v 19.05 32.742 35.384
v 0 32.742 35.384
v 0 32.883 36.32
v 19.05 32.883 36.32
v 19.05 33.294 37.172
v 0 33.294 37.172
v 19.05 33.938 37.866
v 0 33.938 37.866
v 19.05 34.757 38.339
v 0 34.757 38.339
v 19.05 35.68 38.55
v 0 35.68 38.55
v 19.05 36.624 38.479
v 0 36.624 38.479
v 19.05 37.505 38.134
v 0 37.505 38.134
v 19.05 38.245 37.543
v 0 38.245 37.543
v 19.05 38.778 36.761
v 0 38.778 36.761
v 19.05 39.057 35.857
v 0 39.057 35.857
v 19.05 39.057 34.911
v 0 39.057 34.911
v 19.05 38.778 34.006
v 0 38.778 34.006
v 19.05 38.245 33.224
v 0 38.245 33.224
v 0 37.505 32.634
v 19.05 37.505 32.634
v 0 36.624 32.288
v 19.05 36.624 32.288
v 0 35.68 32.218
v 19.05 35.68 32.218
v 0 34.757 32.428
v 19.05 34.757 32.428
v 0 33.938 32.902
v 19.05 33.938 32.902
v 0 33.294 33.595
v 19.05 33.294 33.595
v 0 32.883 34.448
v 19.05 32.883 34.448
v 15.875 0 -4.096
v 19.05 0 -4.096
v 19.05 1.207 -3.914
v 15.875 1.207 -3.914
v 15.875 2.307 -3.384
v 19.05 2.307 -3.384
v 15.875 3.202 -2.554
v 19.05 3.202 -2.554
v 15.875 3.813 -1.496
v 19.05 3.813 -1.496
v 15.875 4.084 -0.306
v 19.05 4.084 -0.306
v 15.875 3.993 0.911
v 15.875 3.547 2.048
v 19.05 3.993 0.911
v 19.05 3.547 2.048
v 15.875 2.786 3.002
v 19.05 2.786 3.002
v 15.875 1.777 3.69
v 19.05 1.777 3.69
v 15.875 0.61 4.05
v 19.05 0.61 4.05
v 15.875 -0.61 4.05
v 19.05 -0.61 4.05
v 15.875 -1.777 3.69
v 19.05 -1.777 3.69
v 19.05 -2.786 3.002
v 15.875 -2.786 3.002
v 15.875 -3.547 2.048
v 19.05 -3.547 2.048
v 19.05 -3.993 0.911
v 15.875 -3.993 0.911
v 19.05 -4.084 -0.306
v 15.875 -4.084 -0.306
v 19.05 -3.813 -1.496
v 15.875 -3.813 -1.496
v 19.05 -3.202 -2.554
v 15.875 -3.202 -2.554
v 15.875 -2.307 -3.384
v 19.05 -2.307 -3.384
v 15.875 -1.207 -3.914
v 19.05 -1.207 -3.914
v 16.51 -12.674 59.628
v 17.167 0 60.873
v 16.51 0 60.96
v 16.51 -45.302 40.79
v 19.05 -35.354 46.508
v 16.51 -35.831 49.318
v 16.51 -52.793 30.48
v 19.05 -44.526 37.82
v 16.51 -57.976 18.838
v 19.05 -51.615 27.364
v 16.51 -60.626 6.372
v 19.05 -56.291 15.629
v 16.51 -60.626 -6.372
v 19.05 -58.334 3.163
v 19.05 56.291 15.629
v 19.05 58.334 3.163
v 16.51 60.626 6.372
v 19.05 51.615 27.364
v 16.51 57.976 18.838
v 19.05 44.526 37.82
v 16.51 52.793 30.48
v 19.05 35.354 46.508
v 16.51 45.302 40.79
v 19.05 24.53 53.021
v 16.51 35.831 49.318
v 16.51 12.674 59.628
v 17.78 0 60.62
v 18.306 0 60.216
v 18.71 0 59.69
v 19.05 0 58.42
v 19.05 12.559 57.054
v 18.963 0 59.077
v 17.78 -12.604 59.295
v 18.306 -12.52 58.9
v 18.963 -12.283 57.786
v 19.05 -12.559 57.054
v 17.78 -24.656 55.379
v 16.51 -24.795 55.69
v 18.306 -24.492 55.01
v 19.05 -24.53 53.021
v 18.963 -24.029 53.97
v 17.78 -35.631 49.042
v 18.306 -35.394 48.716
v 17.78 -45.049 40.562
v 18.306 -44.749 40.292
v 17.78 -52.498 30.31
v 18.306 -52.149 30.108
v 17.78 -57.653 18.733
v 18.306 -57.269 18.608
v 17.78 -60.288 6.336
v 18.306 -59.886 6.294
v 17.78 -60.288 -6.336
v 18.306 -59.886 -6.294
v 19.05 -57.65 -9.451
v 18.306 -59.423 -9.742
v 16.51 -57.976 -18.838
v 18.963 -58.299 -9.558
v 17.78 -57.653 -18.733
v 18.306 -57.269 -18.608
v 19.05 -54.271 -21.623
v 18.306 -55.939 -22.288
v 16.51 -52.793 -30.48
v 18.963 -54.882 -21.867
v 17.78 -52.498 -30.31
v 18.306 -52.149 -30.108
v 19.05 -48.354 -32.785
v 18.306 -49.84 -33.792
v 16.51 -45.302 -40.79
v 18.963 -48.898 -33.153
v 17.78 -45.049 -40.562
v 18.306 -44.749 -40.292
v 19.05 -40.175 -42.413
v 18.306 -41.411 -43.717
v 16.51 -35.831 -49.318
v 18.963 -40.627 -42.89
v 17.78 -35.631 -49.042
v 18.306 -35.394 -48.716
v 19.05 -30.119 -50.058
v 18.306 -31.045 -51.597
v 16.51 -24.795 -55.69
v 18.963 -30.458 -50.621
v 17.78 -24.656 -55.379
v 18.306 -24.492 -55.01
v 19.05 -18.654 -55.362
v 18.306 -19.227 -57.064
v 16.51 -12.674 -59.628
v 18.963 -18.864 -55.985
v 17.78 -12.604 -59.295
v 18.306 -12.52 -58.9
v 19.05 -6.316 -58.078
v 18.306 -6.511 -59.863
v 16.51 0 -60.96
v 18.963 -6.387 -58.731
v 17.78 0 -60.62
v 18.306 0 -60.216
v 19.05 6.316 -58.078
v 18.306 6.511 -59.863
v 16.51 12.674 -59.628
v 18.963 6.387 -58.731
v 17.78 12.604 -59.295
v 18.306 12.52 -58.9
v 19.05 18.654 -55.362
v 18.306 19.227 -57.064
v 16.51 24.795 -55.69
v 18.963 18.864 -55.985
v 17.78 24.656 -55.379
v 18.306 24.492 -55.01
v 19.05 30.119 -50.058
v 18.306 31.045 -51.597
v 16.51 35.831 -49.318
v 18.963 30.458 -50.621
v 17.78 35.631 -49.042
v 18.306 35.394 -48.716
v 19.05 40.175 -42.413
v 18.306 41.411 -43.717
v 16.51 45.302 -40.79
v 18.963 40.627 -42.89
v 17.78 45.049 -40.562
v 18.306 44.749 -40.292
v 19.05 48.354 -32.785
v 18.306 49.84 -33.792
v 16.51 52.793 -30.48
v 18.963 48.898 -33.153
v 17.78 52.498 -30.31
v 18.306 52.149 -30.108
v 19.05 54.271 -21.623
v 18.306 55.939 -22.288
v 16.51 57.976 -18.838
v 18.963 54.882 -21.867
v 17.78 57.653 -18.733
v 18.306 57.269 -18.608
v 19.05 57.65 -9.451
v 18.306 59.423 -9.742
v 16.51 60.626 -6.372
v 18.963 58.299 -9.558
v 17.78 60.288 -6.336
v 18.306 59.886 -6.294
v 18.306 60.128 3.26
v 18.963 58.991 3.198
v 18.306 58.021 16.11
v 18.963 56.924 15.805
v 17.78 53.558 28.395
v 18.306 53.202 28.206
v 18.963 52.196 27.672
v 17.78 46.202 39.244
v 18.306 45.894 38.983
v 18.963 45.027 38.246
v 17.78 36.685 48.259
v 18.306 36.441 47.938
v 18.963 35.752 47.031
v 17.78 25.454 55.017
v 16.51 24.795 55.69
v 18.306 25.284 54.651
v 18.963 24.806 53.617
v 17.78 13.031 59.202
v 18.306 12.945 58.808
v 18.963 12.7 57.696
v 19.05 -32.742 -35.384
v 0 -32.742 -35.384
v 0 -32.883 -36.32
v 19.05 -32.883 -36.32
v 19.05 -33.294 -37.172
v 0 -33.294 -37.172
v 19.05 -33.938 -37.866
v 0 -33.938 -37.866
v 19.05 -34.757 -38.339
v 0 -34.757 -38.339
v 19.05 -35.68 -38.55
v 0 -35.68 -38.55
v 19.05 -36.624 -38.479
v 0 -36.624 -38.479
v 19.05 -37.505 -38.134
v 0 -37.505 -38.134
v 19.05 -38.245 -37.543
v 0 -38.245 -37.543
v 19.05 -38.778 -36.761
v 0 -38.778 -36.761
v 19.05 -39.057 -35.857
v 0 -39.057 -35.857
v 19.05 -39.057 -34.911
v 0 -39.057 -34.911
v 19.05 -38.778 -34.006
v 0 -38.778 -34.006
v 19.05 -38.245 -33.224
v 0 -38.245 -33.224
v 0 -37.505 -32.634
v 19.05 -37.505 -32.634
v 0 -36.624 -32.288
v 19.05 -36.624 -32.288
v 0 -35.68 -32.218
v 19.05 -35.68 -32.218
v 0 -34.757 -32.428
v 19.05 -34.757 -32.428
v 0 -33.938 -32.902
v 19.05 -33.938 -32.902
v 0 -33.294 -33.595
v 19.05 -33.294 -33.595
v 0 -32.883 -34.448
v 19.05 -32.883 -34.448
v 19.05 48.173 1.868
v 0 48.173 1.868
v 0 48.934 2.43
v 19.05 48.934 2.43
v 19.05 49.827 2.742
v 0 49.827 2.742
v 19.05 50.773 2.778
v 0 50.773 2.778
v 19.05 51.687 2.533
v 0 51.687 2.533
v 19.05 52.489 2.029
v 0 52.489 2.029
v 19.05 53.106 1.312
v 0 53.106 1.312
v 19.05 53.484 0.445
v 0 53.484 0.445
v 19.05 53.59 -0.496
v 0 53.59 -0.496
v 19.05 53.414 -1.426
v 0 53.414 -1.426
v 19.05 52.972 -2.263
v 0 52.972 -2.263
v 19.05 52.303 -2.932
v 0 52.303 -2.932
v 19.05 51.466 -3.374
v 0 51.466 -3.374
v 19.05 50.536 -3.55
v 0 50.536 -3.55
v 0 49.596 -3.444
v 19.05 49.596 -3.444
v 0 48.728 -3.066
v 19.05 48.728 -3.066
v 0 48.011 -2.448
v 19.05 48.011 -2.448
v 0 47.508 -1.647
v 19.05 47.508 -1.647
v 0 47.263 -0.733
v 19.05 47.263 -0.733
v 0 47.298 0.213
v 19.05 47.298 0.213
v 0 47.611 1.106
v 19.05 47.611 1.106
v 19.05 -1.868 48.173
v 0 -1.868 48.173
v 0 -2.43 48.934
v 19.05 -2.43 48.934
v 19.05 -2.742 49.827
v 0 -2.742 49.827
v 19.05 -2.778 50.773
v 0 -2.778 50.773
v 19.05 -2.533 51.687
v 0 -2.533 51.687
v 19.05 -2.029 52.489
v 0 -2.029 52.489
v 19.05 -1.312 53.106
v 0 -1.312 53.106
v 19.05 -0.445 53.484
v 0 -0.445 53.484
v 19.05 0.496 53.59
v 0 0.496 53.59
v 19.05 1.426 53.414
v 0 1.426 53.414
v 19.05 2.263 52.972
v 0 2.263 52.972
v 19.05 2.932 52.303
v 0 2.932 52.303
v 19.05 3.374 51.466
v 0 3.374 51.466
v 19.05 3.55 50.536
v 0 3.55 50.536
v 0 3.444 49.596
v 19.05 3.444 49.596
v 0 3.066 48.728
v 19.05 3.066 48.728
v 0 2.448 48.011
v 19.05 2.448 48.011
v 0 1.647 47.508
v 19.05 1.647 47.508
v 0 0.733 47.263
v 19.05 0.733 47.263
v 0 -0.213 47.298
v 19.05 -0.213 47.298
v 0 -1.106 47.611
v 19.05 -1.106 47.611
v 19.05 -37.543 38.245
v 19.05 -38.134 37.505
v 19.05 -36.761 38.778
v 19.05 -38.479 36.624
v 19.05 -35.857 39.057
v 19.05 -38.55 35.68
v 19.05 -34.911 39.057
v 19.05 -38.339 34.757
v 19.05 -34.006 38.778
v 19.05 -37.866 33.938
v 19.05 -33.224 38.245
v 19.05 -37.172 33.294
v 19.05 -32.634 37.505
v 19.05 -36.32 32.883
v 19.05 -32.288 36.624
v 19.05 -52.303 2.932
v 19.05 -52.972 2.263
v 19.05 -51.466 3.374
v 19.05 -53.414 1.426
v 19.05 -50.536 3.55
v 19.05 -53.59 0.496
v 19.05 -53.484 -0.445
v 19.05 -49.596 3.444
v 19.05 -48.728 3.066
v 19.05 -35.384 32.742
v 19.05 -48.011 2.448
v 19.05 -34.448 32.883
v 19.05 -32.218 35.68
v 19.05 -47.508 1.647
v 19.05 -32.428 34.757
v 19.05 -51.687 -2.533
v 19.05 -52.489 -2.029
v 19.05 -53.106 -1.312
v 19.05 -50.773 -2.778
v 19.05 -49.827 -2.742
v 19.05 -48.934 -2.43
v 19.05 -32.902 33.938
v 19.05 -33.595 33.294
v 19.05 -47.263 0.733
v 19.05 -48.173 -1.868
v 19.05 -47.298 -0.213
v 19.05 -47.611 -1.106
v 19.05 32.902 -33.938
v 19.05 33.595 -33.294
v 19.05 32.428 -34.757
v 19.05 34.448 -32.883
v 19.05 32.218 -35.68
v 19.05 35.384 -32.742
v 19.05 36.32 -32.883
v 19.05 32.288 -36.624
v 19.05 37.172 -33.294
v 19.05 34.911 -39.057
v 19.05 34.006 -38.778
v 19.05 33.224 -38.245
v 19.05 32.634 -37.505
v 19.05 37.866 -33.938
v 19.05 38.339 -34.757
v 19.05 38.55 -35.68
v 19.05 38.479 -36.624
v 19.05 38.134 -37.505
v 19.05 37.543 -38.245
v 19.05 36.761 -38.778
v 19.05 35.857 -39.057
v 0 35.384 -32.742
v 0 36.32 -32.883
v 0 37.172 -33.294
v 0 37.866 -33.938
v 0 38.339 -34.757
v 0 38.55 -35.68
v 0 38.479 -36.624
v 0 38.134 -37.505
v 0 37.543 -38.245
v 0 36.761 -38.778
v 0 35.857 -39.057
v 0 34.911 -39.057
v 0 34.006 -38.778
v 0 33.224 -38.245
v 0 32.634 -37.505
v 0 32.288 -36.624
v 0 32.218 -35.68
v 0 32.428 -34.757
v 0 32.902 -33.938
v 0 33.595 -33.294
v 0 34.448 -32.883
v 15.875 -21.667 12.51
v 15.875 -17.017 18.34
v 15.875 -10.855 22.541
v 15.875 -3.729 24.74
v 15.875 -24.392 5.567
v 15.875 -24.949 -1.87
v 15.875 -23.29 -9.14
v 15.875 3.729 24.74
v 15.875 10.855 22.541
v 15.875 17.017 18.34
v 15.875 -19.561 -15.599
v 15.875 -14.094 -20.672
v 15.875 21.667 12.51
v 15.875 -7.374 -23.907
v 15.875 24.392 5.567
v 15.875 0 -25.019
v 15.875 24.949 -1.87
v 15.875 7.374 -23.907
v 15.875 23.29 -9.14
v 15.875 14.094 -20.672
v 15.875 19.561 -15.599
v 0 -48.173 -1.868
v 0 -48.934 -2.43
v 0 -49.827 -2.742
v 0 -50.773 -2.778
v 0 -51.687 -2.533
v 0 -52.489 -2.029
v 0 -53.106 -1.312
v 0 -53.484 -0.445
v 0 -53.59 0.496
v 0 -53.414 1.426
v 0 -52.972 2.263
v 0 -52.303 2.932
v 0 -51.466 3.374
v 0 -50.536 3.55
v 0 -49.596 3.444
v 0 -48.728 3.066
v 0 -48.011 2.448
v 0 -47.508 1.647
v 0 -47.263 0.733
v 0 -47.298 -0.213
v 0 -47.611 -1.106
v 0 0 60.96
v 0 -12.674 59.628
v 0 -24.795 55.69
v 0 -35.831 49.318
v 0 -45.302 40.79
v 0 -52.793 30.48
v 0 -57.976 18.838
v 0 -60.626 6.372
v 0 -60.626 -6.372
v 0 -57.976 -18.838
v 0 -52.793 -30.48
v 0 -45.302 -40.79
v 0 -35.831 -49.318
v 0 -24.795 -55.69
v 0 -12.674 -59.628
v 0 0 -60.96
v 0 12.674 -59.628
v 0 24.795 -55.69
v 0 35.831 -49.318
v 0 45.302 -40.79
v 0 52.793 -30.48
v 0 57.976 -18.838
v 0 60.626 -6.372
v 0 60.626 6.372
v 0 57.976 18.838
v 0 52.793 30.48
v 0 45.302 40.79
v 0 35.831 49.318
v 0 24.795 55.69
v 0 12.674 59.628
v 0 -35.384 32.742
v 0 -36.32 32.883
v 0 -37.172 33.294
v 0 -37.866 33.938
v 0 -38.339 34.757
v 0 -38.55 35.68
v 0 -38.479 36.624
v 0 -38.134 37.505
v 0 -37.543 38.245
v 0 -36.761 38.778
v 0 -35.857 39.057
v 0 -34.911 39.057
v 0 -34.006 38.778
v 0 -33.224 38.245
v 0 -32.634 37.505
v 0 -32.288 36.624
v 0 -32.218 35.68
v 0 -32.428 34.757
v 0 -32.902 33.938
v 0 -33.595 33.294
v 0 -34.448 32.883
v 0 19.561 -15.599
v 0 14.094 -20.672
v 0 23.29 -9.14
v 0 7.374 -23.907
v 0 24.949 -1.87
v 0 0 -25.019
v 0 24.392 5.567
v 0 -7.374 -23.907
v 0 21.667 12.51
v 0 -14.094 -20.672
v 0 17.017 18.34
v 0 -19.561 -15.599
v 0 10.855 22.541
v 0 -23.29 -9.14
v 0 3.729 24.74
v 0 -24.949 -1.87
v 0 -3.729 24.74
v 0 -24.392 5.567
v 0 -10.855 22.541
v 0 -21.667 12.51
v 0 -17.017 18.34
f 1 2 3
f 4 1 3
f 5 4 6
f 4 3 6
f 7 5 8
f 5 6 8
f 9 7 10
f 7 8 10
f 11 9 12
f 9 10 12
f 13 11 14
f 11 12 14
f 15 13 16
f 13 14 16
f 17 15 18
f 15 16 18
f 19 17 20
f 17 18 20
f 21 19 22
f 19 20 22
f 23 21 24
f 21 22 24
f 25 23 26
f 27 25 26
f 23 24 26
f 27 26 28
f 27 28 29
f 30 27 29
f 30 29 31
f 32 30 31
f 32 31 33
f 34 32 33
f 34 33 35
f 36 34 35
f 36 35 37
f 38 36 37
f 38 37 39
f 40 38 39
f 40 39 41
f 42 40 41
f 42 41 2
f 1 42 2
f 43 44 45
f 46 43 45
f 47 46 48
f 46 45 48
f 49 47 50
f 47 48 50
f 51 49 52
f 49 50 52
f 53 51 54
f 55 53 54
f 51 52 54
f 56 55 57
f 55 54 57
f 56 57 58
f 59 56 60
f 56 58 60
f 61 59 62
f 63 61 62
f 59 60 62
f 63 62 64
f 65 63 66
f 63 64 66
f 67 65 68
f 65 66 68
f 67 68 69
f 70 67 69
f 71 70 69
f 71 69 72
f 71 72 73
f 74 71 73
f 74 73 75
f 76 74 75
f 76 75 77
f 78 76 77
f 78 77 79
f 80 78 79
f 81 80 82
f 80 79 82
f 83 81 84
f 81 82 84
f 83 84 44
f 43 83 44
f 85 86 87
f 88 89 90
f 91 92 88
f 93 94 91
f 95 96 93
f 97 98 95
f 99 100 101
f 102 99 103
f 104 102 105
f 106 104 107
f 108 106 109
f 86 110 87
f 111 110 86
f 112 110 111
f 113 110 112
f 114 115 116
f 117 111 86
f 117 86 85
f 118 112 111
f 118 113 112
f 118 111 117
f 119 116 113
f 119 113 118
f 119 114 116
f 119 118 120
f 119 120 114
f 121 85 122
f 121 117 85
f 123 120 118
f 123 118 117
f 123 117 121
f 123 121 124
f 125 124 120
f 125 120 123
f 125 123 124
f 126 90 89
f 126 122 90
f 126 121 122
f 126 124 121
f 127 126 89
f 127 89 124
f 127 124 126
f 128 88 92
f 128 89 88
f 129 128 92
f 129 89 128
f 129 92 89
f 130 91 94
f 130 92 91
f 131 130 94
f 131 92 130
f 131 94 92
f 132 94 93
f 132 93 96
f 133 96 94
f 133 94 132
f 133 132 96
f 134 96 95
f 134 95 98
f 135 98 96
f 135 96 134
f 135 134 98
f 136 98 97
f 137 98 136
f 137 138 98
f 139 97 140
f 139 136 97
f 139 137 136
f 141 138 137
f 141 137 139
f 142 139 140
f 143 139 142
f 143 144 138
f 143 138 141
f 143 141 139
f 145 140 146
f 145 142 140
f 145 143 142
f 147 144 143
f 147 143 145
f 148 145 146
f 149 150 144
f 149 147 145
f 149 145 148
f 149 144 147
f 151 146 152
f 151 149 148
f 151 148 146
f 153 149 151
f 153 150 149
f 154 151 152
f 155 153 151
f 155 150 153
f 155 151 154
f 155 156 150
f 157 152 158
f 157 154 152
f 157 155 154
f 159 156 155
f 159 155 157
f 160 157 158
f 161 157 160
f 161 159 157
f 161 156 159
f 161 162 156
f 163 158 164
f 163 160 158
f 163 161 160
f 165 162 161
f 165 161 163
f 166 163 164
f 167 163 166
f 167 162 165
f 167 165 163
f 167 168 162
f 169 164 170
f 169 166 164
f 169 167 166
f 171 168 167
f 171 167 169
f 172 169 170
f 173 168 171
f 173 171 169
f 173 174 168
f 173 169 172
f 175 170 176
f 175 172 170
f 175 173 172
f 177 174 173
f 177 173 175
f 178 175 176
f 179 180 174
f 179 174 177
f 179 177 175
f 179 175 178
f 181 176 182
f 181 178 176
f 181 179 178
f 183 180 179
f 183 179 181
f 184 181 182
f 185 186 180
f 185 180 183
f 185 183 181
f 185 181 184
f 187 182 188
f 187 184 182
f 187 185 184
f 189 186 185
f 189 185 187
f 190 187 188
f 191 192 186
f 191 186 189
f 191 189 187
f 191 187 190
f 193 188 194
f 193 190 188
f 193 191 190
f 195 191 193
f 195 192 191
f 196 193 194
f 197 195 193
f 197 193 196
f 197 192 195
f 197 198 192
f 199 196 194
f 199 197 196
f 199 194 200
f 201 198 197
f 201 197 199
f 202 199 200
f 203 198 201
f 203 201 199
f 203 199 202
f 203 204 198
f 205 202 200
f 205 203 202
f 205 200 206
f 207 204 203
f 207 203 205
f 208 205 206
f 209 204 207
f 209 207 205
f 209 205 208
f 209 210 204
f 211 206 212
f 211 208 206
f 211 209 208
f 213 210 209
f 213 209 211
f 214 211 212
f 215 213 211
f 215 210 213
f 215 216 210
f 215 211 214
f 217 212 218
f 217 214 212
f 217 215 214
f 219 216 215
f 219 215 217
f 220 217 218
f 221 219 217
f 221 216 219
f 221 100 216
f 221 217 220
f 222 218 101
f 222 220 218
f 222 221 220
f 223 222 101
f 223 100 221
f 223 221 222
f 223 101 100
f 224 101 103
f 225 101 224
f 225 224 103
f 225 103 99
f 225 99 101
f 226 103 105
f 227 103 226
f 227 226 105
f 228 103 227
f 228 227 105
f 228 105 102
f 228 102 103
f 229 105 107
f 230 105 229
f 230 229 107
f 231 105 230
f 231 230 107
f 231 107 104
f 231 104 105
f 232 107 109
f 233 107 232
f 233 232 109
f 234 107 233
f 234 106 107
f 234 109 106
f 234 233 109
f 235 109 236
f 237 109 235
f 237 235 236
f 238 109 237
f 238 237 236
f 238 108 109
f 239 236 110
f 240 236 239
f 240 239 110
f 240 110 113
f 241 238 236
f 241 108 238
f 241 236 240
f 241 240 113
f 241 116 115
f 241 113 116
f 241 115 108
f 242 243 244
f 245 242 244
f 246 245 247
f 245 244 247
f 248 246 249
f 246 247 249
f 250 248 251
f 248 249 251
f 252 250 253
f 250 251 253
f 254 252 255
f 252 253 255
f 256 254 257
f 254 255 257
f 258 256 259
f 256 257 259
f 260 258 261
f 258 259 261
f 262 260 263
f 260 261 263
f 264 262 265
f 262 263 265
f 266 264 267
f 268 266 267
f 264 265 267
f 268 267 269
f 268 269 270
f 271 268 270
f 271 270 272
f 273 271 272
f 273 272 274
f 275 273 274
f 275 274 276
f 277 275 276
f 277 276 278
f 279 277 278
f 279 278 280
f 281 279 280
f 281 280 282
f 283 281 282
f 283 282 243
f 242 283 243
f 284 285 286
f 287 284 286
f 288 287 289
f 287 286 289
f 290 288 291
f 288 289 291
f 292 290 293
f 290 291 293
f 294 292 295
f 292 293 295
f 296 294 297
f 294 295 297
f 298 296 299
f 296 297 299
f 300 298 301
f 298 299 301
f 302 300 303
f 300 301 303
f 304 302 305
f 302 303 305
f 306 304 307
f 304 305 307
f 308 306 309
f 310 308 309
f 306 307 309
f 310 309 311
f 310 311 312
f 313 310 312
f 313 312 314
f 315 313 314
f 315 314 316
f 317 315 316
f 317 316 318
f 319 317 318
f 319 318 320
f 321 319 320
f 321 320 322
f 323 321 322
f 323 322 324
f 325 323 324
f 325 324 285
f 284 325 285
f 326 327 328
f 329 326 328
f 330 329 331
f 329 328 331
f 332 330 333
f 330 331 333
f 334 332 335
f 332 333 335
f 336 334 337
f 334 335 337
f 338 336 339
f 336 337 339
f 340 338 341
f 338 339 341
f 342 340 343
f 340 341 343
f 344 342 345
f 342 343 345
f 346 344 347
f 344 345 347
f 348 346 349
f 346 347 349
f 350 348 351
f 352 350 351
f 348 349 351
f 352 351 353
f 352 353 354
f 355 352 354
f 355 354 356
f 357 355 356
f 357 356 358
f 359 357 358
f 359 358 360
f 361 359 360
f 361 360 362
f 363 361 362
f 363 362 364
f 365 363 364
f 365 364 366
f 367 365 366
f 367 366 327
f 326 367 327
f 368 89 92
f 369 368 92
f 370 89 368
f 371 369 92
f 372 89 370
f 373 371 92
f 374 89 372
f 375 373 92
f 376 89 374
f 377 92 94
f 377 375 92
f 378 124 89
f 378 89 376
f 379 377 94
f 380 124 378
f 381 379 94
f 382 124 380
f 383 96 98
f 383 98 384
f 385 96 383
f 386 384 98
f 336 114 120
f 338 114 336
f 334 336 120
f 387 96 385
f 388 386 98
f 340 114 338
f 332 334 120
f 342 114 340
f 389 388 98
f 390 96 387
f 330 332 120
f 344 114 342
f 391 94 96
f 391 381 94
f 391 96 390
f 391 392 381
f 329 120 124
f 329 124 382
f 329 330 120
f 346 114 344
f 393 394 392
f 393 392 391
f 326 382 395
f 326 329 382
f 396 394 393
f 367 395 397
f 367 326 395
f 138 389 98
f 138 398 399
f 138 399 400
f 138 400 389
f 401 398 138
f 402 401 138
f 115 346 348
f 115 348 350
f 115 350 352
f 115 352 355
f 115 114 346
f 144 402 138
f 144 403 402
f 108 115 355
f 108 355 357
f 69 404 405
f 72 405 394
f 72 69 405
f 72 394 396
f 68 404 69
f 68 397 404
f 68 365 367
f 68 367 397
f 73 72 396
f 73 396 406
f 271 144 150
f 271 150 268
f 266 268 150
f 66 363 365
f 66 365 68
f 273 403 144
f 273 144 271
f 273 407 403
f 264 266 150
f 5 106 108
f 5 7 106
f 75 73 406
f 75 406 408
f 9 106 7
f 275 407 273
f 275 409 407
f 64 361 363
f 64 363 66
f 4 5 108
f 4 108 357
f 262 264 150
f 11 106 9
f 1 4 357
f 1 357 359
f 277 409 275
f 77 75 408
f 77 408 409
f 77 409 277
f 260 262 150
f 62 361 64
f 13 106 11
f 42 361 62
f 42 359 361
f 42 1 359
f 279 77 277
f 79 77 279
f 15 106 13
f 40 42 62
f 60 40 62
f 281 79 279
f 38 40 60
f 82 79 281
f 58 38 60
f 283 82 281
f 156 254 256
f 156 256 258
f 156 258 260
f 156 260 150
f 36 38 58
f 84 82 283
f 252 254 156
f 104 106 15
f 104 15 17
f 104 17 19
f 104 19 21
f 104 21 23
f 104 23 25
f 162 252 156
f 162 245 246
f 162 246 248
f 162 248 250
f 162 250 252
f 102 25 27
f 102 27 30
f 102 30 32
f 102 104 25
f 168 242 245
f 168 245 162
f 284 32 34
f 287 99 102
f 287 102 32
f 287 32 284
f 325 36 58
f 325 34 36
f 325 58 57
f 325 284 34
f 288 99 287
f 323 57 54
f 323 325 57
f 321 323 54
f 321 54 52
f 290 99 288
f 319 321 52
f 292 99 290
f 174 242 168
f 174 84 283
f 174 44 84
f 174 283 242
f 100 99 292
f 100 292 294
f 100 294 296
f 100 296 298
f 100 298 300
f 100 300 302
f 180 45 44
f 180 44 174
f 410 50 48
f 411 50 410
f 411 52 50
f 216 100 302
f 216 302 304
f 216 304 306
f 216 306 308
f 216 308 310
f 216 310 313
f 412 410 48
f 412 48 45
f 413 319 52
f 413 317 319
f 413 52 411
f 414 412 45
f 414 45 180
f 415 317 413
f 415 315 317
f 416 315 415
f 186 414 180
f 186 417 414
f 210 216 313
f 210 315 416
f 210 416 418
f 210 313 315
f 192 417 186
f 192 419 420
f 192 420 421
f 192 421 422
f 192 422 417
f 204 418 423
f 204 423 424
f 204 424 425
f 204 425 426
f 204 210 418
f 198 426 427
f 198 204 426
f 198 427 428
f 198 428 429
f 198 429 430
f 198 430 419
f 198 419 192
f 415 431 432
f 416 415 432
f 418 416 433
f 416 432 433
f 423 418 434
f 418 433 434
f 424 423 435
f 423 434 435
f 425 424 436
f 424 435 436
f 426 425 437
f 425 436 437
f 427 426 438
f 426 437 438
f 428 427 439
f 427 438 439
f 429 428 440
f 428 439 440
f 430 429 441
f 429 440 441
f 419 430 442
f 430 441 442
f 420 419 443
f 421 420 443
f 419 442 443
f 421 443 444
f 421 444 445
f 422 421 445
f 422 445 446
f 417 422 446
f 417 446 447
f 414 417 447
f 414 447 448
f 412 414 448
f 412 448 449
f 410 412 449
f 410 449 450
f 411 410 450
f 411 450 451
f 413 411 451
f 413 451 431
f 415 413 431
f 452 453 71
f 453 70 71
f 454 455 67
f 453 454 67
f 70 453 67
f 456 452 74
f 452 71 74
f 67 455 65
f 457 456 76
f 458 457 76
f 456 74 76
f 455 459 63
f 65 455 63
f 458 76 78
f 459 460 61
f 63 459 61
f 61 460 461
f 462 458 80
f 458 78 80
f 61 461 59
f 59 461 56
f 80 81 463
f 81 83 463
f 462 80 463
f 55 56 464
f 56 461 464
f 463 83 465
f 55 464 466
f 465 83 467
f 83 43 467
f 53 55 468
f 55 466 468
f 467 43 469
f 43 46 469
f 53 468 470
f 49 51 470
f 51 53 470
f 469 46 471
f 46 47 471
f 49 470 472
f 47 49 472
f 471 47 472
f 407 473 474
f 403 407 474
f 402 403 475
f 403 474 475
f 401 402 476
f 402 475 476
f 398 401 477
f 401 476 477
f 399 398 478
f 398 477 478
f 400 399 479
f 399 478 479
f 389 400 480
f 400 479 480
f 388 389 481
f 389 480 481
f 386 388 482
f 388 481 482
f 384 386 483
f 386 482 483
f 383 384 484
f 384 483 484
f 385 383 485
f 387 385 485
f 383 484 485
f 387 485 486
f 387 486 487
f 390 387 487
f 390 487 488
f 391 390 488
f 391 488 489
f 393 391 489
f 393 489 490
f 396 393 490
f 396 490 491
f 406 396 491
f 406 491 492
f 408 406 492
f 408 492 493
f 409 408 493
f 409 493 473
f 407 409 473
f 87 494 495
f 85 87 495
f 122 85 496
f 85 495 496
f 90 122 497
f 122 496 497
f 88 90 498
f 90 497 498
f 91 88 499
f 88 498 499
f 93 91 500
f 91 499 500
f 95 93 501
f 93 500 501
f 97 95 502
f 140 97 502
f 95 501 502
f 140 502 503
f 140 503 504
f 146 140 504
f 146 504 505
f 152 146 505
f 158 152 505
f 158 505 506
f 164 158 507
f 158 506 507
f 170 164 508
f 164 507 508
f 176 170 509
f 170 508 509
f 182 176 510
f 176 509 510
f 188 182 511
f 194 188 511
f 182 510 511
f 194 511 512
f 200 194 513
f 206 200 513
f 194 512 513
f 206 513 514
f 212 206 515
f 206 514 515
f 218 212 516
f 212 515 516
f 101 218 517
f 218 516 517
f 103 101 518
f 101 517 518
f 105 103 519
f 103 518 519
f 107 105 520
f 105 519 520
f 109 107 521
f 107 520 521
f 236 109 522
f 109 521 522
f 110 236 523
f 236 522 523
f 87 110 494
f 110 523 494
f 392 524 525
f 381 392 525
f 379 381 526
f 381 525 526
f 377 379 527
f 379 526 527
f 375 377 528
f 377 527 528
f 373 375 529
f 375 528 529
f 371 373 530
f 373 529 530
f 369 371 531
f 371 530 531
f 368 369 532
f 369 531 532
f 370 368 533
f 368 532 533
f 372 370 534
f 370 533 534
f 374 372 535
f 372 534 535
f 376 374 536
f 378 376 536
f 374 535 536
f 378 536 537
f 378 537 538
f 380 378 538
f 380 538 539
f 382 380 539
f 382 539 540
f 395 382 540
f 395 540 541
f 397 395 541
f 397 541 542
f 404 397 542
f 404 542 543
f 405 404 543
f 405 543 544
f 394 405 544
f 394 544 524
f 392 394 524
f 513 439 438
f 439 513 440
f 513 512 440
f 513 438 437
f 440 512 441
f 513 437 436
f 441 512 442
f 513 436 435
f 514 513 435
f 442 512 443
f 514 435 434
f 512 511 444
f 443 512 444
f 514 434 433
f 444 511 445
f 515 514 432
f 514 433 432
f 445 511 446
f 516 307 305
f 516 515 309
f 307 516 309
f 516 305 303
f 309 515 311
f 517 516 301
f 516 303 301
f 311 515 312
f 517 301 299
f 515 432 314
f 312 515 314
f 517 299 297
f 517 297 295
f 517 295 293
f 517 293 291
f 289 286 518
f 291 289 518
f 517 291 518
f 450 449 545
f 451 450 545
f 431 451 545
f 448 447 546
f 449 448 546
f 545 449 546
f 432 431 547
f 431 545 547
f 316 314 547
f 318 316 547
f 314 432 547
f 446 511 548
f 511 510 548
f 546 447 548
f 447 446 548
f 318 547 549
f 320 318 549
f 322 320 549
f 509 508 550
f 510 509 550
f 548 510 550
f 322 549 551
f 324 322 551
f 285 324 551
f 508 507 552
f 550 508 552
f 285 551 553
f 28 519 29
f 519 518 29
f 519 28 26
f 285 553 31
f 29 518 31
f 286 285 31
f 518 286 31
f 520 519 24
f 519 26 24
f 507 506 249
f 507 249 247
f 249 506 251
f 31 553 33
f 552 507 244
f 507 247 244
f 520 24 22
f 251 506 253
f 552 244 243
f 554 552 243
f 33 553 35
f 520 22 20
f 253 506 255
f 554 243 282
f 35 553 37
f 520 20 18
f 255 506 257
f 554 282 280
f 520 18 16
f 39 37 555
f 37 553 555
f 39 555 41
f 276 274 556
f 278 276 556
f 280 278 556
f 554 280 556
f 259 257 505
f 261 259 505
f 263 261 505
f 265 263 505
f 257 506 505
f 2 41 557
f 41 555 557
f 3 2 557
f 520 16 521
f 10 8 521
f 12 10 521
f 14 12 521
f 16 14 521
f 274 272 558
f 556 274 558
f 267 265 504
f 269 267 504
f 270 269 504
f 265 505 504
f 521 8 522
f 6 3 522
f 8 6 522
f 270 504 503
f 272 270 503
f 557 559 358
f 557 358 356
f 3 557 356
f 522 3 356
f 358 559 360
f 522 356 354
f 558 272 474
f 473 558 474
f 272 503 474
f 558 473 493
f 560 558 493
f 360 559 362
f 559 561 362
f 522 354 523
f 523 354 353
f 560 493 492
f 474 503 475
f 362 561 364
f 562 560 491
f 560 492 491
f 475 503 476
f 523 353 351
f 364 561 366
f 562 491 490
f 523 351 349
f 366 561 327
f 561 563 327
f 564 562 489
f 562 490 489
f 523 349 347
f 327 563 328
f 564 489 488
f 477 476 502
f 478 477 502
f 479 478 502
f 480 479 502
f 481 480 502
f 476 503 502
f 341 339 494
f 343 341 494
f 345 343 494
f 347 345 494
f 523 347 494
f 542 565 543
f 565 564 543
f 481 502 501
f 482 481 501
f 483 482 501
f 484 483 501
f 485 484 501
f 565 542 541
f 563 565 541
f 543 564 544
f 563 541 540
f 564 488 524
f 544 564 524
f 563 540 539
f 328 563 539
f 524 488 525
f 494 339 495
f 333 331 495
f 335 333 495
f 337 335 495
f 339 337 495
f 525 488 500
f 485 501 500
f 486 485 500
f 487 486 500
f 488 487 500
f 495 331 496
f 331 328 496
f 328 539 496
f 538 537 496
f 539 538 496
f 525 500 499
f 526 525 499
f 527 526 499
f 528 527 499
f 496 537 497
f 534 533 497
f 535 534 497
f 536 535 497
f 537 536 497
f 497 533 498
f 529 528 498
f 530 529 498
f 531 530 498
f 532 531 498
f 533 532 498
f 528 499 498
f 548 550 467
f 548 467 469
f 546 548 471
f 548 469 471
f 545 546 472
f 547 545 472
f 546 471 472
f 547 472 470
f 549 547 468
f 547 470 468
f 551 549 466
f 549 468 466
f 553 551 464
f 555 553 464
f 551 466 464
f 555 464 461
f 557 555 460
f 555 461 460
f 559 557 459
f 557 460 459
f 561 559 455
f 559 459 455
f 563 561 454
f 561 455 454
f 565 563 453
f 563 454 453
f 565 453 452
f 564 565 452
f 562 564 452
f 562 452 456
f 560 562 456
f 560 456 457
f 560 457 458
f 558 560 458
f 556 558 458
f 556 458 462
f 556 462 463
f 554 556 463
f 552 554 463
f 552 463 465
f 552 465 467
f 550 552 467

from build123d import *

# Parameters (mm, degrees)
SKETCH1_R           = 60.96
BOSS_EXTRUDE1_DEPTH = 19.05
FILLET1_R           = 2.54
SKETCH2_R           = 4
CUT_EXTRUDE1_DEPTH  = 6.35
SKETCH4_R           = 25.019
CUT_EXTRUDE3_DEPTH  = 89.290122324
SKETCH5_R           = 3.175
CUT_EXTRUDE4_DEPTH  = 89.290122324
CIRPATTERN2_COUNT   = 8
SKETCH6_R           = 25.019
SKETCH6_R_2         = 4.09575
BOSS_EXTRUDE2_DEPTH = 3.175


with BuildPart() as part:
    # Sketch1 → Boss-Extrude1 (new body)
    with BuildSketch(Plane(origin=(0, 0, 0), x_dir=(0, 0, -1), z_dir=(1, 0, 0))):
        with Locations(Location((0, 0, 0), (0, 0, 180))):
            Circle(SKETCH1_R)
    extrude(amount=BOSS_EXTRUDE1_DEPTH)

    # Fillet1
    fillet1_edges = [part.edges().sort_by_distance(p)[0] for p in [
        (19.05, 0, -60.96),
    ]]
    fillet(fillet1_edges, radius=FILLET1_R)

    # Sketch2 → Cut-Extrude1 (cut)
    with BuildSketch(Plane(origin=(19.05, 0, 0), x_dir=(0, 0, -1), z_dir=(1, 0, 0))):
        Circle(SKETCH2_R)
    extrude(amount=-CUT_EXTRUDE1_DEPTH, mode=Mode.SUBTRACT)

    # Sketch4 → Cut-Extrude3 (cut, through all)
    with BuildSketch(Plane(origin=(19.05, 0, 0), x_dir=(0, 0, -1), z_dir=(1, 0, 0))):
        Circle(SKETCH4_R)
    extrude(amount=-CUT_EXTRUDE3_DEPTH, mode=Mode.SUBTRACT)

    # Sketch5 → Cut-Extrude4 (cut, through all)
    with BuildSketch(Plane.ZY):
        with Locations((-35.91734849, 35.383889532)):
            Circle(SKETCH5_R)
    cut_extrude4 = extrude(amount=-CUT_EXTRUDE4_DEPTH, mode=Mode.SUBTRACT)

    # CirPattern2: Cut-Extrude4 ×8 about axis, 1 skipped
    cirpattern2_axis = Axis((0, 0, 0), (1, 0, 0))
    add([cut_extrude4.rotate(cirpattern2_axis, i * 360 / CIRPATTERN2_COUNT) for i in range(1, CIRPATTERN2_COUNT) if i not in (7,)], mode=Mode.SUBTRACT)

    # Sketch6 → Boss-Extrude2 (add)
    with BuildSketch(Plane(origin=(19.05, 0, 0), x_dir=(0, 0, -1), z_dir=(1, 0, 0))):
        Circle(SKETCH6_R)
        Circle(SKETCH6_R_2, mode=Mode.SUBTRACT)
    extrude(amount=-BOSS_EXTRUDE2_DEPTH)


solid = part.part
